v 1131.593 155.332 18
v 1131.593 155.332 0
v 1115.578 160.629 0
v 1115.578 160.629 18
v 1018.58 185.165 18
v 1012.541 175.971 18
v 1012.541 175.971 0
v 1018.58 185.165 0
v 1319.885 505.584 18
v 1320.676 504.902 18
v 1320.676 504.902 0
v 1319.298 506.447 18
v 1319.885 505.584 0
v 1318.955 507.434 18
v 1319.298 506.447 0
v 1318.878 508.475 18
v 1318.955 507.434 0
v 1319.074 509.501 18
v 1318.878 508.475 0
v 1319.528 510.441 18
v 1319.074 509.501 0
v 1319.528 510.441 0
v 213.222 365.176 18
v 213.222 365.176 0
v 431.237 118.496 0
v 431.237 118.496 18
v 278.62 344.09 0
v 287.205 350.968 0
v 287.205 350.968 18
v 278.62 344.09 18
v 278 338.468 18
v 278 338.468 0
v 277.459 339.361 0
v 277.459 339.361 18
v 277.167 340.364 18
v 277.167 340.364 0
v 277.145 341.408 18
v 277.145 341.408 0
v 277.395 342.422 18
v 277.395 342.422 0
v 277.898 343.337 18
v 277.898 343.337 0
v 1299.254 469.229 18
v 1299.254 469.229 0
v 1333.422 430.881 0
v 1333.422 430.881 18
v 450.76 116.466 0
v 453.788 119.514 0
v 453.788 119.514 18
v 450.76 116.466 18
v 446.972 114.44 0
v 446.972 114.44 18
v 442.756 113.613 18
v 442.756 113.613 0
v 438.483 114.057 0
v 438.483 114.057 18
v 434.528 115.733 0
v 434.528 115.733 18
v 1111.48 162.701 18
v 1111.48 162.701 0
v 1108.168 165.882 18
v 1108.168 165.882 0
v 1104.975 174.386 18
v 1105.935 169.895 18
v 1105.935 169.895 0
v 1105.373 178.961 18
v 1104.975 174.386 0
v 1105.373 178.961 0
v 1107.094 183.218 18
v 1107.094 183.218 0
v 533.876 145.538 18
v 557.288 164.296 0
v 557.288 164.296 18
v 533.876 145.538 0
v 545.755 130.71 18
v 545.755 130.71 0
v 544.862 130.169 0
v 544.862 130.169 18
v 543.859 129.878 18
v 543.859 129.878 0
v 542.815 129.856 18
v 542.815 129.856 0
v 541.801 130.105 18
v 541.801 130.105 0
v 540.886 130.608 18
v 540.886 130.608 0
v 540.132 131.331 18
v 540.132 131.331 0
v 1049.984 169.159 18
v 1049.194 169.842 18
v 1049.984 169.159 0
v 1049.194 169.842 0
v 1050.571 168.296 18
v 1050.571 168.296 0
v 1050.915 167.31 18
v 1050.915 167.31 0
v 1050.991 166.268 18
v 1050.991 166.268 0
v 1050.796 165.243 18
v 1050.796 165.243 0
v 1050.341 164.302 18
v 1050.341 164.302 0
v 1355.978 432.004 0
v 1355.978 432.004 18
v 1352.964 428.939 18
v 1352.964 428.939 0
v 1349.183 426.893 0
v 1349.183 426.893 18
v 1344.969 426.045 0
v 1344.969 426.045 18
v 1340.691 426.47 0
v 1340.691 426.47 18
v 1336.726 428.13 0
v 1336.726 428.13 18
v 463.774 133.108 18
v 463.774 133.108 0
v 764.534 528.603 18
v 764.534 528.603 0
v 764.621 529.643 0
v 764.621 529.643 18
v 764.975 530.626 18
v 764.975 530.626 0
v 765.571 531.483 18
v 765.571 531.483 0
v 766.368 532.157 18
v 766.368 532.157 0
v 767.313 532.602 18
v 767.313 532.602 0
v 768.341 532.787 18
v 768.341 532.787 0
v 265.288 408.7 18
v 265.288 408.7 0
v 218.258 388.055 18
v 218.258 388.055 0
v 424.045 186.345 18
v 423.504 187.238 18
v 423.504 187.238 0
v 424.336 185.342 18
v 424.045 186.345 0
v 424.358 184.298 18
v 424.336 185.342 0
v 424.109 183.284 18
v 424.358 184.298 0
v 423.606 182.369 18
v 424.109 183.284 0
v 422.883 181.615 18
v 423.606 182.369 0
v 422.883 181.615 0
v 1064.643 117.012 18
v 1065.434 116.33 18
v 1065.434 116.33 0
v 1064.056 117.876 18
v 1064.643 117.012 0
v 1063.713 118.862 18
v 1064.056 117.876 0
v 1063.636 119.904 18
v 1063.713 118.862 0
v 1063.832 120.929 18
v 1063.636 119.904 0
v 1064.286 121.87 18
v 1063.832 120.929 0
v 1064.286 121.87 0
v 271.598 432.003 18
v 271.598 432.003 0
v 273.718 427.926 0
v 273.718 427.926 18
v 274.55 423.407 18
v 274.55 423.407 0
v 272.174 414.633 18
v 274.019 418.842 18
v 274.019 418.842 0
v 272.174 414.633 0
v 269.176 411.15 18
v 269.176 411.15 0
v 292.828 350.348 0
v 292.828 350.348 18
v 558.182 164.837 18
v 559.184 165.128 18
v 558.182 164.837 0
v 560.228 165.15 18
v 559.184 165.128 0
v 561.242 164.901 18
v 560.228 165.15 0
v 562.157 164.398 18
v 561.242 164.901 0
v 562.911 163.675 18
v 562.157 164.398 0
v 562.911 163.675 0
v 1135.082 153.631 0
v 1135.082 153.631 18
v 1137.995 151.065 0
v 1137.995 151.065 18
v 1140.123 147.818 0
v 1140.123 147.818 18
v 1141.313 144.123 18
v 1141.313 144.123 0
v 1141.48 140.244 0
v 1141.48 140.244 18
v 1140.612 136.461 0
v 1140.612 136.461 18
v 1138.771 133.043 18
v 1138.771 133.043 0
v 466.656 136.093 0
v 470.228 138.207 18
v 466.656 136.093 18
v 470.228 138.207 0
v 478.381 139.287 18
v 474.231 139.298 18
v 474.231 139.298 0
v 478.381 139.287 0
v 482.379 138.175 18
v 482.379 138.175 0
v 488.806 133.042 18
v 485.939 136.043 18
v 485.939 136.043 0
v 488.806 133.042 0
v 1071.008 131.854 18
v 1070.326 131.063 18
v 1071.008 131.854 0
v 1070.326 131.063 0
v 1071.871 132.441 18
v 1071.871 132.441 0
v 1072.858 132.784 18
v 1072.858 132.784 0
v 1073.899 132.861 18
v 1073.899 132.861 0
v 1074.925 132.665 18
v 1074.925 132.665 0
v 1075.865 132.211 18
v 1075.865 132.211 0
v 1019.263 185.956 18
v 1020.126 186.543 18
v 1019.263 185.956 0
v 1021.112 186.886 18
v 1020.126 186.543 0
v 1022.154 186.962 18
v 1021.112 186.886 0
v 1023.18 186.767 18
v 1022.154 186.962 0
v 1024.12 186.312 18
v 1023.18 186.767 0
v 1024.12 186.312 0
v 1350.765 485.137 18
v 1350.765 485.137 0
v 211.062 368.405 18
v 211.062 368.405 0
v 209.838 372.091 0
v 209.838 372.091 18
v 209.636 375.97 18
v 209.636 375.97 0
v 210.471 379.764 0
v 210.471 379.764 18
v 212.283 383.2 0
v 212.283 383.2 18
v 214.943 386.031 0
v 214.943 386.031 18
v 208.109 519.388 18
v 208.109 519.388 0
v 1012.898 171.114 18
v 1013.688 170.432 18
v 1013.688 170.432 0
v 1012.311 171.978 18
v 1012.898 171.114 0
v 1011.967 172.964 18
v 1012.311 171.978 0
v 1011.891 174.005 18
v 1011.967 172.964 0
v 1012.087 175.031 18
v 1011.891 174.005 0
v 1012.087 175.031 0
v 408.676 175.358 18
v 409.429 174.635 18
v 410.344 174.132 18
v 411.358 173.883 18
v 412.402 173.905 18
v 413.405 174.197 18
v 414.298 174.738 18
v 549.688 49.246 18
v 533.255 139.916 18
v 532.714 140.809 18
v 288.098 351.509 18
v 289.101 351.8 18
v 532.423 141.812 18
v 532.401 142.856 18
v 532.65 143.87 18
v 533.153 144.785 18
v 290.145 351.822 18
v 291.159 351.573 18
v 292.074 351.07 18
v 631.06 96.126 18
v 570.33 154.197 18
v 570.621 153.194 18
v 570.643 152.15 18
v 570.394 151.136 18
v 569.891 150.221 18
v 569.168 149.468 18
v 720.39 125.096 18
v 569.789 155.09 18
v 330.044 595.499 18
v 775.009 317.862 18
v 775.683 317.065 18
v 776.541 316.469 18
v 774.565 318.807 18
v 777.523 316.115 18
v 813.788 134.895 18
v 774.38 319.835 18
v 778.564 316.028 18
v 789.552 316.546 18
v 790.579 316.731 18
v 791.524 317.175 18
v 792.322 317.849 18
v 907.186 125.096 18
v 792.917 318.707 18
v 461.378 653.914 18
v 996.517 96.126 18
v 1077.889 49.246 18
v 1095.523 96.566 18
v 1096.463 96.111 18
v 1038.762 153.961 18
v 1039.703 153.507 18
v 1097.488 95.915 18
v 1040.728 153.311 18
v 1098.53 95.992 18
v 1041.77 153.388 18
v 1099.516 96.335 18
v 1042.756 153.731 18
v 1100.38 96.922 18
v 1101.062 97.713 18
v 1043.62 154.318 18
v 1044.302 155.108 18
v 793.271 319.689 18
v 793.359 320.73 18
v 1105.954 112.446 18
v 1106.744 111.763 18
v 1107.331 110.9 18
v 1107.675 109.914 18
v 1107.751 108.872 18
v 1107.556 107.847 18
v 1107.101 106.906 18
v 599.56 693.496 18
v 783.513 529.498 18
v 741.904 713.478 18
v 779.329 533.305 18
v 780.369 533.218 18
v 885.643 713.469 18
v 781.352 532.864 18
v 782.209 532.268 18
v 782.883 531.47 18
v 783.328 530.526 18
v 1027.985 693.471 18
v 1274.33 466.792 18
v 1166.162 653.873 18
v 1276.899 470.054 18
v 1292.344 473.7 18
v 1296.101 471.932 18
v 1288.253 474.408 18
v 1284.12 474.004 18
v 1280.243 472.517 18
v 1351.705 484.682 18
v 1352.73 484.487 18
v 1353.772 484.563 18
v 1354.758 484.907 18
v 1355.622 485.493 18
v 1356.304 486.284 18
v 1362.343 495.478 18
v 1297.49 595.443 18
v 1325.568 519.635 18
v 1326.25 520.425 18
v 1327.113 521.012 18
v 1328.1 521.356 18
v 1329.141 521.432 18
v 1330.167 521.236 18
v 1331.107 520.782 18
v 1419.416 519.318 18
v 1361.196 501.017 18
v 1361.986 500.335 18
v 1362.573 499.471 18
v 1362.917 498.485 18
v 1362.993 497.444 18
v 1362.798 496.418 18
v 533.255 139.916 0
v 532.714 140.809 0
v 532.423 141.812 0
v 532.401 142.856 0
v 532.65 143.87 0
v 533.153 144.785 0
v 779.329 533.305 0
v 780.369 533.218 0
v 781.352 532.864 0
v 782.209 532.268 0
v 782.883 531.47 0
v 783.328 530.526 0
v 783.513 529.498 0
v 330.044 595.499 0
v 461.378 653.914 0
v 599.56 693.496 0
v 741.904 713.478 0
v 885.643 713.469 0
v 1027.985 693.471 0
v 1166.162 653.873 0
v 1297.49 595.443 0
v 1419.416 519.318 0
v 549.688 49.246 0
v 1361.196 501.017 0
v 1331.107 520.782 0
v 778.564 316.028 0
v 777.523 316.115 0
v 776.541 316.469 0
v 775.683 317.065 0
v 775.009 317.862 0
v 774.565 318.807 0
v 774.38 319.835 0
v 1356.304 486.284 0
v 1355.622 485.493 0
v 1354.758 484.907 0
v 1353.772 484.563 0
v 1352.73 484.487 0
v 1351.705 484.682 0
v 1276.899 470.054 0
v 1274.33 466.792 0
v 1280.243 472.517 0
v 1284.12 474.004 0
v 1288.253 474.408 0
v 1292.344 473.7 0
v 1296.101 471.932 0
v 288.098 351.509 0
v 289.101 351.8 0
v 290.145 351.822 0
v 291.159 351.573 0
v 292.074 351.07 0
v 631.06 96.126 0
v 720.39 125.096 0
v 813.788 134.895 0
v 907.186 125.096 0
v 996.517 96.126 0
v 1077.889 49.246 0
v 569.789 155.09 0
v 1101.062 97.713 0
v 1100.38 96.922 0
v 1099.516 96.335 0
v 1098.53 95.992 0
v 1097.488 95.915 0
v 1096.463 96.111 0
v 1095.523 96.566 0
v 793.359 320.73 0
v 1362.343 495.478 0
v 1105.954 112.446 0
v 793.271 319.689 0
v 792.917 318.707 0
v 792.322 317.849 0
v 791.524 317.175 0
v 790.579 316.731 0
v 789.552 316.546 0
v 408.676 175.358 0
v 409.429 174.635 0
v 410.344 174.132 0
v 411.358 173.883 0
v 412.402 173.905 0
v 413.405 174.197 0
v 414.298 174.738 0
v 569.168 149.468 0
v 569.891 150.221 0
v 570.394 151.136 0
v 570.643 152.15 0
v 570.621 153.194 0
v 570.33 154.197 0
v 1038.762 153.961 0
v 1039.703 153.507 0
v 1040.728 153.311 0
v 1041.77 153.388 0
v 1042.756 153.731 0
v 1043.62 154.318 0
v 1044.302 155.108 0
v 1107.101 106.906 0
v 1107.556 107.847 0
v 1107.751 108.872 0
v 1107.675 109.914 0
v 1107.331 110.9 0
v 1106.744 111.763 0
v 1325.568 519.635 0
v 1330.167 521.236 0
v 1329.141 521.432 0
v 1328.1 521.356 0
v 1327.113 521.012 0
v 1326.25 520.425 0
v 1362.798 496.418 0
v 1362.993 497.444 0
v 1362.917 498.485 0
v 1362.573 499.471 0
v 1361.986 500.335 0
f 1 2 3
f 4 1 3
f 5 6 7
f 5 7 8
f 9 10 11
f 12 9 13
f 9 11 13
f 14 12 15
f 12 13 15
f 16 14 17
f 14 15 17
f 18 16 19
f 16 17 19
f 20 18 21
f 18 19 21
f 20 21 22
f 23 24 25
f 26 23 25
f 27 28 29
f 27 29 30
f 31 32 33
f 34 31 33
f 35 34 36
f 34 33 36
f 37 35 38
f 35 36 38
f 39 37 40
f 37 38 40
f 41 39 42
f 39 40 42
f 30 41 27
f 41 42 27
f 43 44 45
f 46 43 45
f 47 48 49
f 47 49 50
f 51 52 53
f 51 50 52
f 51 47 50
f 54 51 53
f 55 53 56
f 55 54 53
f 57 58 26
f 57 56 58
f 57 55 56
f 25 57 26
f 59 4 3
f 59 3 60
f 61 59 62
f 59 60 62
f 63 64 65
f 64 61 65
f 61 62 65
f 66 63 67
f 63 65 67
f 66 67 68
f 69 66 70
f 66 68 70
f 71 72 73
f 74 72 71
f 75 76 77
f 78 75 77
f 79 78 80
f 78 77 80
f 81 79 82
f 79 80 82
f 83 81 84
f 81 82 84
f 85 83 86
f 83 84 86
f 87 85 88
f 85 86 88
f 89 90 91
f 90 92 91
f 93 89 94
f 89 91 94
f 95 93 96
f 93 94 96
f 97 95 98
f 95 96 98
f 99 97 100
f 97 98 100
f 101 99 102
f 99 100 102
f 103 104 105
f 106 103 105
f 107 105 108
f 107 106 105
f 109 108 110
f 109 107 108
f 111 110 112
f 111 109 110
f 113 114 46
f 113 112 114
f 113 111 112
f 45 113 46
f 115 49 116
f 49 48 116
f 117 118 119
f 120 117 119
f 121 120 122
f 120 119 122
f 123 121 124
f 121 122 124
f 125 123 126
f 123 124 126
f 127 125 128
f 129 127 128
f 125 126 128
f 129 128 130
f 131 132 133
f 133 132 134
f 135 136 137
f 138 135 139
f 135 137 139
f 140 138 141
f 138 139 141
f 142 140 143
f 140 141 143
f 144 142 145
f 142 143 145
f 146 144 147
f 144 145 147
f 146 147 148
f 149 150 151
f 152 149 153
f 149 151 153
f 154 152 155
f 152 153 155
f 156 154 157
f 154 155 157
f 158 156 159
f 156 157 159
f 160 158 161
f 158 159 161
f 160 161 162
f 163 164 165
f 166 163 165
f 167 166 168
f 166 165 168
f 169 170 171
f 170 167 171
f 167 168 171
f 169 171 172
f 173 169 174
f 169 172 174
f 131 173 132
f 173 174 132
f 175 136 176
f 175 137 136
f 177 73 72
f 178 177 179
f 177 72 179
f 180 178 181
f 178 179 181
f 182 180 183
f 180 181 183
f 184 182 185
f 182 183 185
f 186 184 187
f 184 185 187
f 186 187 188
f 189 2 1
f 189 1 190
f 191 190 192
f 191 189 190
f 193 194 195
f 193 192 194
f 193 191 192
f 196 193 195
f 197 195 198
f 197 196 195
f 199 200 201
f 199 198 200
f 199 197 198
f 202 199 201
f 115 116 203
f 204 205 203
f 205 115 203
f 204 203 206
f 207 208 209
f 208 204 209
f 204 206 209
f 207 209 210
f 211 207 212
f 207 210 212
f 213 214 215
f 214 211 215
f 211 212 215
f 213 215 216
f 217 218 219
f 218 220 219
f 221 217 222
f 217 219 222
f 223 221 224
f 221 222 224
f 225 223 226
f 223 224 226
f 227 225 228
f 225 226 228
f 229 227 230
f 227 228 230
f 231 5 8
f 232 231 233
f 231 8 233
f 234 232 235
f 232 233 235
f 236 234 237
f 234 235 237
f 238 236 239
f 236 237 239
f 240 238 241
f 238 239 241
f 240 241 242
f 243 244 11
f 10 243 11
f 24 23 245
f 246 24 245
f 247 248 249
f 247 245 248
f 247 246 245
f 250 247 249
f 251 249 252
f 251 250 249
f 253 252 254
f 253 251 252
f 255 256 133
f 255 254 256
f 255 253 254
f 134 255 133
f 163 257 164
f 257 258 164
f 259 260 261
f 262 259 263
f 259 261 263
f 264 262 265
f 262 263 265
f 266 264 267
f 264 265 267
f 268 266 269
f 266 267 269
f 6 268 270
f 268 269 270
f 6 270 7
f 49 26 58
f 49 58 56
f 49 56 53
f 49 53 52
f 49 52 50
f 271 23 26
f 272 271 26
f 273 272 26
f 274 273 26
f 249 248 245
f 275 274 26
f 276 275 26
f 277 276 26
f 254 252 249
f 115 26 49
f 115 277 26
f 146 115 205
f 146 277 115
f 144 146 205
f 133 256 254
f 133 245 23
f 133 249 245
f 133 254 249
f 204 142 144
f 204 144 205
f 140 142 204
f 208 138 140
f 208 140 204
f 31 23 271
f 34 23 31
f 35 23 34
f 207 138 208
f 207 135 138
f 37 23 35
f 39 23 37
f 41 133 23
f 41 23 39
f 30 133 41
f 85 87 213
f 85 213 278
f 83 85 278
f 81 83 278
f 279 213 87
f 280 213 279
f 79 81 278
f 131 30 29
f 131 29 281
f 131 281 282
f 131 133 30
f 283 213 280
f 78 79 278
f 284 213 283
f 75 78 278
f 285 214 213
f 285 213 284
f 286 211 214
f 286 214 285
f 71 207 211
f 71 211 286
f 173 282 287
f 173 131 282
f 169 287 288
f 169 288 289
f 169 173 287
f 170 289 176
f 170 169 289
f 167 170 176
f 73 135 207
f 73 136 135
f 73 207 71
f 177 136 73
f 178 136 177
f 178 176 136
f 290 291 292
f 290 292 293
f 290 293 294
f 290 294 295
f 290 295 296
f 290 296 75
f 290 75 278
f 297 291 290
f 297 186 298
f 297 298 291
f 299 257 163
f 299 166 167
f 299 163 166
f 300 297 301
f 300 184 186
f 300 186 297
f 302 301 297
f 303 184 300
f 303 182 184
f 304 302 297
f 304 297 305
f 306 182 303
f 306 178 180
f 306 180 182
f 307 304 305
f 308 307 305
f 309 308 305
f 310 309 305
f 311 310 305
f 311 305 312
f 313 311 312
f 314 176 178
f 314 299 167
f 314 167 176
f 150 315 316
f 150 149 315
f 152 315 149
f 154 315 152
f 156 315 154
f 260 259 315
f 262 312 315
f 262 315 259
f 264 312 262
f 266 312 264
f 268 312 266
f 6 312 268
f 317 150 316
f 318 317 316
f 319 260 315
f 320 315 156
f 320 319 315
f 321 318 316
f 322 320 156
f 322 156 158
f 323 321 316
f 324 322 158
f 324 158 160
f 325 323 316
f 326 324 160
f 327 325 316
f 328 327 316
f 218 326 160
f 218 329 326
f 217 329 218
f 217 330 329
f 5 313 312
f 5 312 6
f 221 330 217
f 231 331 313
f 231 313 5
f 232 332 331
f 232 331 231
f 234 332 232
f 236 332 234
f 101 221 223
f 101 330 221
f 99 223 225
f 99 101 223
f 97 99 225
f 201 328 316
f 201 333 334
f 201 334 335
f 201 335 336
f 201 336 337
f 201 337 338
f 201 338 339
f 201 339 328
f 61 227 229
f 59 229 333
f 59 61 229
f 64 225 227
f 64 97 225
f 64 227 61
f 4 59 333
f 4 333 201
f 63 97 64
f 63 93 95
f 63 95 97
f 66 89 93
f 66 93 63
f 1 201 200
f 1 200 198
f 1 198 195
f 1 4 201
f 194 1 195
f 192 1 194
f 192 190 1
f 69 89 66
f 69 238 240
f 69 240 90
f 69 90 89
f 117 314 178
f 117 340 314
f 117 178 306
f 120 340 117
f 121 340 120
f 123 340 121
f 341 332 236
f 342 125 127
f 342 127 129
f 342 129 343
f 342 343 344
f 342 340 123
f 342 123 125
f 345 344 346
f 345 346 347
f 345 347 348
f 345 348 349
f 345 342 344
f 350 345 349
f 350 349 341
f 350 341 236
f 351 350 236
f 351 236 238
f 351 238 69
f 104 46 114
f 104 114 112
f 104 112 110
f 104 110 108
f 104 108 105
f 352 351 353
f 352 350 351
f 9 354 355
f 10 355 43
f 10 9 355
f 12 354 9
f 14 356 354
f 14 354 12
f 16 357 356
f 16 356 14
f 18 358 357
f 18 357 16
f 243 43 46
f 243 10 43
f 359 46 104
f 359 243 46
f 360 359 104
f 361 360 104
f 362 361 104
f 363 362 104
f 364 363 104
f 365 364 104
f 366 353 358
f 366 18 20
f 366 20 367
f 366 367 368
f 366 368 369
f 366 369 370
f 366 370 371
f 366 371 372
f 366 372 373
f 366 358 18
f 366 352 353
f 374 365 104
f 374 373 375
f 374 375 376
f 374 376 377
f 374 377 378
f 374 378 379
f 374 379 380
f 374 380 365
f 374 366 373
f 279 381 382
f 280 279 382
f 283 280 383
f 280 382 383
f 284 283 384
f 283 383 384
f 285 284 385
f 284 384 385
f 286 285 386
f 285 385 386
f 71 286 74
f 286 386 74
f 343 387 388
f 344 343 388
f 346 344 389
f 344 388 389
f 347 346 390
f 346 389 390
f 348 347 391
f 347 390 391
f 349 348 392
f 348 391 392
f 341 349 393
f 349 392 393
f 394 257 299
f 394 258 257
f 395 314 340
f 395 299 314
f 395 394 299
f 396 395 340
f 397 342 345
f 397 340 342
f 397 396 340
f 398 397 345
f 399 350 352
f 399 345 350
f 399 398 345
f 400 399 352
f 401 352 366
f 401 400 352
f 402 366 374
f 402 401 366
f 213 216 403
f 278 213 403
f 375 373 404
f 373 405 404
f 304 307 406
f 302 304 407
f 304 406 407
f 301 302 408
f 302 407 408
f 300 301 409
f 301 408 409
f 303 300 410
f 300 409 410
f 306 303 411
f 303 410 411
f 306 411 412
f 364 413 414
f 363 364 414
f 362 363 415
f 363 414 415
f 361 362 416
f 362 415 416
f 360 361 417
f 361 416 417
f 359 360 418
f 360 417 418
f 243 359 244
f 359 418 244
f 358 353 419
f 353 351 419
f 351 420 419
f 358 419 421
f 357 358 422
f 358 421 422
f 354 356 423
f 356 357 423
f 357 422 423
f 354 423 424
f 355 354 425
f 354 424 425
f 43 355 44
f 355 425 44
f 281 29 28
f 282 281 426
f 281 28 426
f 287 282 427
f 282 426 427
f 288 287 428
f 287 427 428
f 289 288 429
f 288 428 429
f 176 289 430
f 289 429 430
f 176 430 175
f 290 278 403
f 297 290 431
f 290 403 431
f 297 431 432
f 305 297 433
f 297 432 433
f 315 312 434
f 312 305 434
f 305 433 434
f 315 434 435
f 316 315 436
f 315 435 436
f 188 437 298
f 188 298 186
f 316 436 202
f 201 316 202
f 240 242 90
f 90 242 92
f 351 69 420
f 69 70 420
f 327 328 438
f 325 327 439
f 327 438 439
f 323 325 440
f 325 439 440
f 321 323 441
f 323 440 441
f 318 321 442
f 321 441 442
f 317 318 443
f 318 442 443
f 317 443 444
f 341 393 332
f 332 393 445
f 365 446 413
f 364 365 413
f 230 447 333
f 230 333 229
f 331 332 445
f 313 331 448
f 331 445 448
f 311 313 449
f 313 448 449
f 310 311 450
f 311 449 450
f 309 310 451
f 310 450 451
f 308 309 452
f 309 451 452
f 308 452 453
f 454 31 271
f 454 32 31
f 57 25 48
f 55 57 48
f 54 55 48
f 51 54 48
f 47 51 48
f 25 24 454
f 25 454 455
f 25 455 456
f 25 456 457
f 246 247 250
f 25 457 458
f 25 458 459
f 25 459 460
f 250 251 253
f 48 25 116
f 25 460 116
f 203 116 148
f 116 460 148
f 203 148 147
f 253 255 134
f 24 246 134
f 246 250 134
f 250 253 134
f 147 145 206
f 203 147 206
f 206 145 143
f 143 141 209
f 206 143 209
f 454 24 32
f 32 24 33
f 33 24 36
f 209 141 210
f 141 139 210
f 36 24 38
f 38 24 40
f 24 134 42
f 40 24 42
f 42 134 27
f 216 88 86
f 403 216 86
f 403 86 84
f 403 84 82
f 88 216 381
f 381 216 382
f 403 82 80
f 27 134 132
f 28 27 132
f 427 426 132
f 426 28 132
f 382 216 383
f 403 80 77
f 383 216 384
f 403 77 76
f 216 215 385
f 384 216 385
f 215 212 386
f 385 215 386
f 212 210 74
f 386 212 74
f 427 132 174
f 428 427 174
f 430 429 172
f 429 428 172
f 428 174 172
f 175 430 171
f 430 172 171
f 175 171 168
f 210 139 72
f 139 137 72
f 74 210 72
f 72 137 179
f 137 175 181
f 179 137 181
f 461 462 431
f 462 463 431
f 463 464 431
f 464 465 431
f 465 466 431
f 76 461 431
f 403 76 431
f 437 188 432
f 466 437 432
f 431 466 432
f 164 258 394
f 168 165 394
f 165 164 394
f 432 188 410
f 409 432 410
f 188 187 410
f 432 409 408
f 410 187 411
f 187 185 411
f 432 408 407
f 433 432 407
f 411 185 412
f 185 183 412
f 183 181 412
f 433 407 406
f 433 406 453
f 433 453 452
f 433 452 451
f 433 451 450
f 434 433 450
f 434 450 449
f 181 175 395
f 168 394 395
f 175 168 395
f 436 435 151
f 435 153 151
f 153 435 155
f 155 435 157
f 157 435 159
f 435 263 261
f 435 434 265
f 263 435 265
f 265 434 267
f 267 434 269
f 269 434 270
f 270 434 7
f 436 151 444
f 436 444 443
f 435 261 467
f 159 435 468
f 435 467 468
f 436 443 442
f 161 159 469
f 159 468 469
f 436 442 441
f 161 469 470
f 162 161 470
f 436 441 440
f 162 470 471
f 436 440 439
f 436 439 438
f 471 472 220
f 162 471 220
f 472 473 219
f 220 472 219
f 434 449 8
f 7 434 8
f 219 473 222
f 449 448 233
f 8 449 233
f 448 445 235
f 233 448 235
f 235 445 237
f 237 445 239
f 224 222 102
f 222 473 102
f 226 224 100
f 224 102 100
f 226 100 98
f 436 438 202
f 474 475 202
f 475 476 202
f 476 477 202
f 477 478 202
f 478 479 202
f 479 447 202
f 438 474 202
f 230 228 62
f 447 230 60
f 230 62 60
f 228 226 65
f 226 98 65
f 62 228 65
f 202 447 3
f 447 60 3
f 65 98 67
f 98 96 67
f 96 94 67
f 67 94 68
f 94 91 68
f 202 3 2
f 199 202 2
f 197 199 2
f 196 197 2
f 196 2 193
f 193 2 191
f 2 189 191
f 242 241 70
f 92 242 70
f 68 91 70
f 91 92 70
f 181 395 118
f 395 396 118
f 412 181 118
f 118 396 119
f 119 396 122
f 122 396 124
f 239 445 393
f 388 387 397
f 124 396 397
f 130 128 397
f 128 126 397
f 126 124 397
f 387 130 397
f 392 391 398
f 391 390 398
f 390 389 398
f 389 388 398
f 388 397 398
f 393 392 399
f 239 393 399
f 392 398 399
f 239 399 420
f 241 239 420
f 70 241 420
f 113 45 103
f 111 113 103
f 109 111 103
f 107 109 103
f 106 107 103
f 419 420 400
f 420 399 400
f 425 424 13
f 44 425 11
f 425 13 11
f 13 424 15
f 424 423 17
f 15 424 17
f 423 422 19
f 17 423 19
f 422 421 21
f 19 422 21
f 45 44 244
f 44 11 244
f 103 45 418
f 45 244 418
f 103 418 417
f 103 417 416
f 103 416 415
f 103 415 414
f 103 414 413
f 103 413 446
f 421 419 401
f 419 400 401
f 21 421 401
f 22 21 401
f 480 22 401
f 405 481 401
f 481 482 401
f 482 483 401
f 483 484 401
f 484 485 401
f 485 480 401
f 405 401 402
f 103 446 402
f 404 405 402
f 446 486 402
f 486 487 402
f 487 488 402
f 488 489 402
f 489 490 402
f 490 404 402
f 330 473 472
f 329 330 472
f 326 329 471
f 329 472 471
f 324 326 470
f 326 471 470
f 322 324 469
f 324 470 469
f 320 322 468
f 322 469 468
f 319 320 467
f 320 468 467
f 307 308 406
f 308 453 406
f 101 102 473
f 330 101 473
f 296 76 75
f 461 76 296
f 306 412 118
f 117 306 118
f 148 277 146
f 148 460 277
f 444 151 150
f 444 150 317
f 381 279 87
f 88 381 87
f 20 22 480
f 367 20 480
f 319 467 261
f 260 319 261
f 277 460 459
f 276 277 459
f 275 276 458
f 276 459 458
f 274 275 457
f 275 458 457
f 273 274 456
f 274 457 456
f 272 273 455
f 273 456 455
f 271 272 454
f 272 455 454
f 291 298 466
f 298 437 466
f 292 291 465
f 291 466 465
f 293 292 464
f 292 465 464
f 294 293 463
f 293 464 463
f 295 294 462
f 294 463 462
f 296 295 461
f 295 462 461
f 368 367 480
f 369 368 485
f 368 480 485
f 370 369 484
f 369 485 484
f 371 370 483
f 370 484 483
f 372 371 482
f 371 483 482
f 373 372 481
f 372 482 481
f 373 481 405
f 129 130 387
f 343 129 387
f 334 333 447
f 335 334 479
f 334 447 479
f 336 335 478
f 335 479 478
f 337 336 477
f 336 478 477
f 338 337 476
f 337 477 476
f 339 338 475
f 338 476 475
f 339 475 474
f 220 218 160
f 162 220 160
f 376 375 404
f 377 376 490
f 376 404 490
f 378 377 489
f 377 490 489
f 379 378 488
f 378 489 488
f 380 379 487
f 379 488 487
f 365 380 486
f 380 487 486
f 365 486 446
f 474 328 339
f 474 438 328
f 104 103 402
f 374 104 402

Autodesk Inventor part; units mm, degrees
ref_plane "YZ Plane" through (0, 0, 0) normal (1, 0, 0) x (0, 1, 0)
ref_plane "XZ Plane" through (0, 0, 0) normal (0, 1, 0) x (-1, 0, 0)
ref_plane "XY Plane" through (0, 0, 0) normal (0, 0, 1) x (1, 0, 0)
sketch "Sketch1" plane through (0, 0, 0) normal (0, 0, 1) x (1, 0, 0)
  point P0 (0, 0)
sketch "CONTOURS" plane through (0, 0, 0) normal (0, 0, 1) x (1, 0, 0)
  arc A0 (1138.7708, 133.0427) -> (1131.5929, 155.3323) centre (1127.04, 141.5656) ccw
  line L0 (1131.5929, 155.3323) -> (1115.5781, 160.6286)
  arc A1 (1107.0938, 183.2185) -> (1115.5781, 160.6286) centre (1120.445, 175.3447) ccw
  line L1 (1107.0938, 183.2185) -> (1274.33, 466.7921)
  arc A2 (1299.254, 469.2294) -> (1274.33, 466.7921) centre (1287.6812, 458.9183) ccw
  line L2 (1299.254, 469.2294) -> (1333.4216, 430.8808)
  arc A3 (1333.4216, 430.8808) -> (1355.9785, 432.0038) centre (1344.2478, 440.5267) ccw
  line L3 (1355.9785, 432.0038) -> (1419.4157, 519.3176)
  arc A4 (1419.4157, 519.3176) -> (208.109, 519.3881) centre (813.7138, -315.0977) ccw
  line L4 (208.109, 519.3881) -> (271.5978, 432.0034)
  arc A5 (265.2883, 408.6999) -> (271.5978, 432.0034) centre (259.0581, 422.8927) ccw
  line L5 (265.2883, 408.6999) -> (218.2583, 388.055)
  arc A6 (218.2583, 388.055) -> (213.2217, 365.1756) centre (224.0866, 374.778) ccw
  line L6 (213.2217, 365.1756) -> (431.2374, 118.4955)
  arc A7 (431.2374, 118.4955) -> (453.7882, 119.5137) centre (442.1023, 128.0978) ccw
  line L7 (453.7882, 119.5137) -> (463.7742, 133.108)
  arc A8 (488.8058, 133.0425) -> (463.7742, 133.108) centre (476.2661, 123.9318) ccw
  line L8 (488.8058, 133.0425) -> (549.6876, 49.246)
  arc A9 (1077.8891, 49.2462) -> (549.6876, 49.246) centre (813.7885, -315.108) ccw
  line L9 (1077.8891, 49.2462) -> (1138.7708, 133.0427)
sketch "HOLES" plane through (0, 0, 0) normal (0, 0, 1) x (1, 0, 0)
  line L0 (287.205, 350.9682) -> (278.6203, 344.0905)
  arc A0 (278.6203, 344.0905) -> (277.9995, 338.4678) centre (281.1212, 340.9688) ccw
  line L1 (277.9995, 338.4678) -> (408.6757, 175.3582)
  arc A1 (408.6757, 175.3582) -> (414.2984, 174.7375) centre (411.7974, 177.8592) ccw
  line L2 (414.2984, 174.7375) -> (422.8831, 181.6152)
  arc A2 (422.8831, 181.6152) -> (423.5039, 187.2379) centre (420.3822, 184.7369) ccw
  line L3 (423.5039, 187.2379) -> (292.8277, 350.3475)
  arc A3 (292.8277, 350.3475) -> (287.205, 350.9682) centre (289.706, 347.8465) ccw
  arc A4 (783.5127, 529.4978) -> (779.3287, 533.3049) centre (779.5172, 529.3094) ccw
  line L4 (783.5127, 529.4978) -> (793.3586, 320.7299)
  arc A5 (789.5515, 316.5459) -> (793.3586, 320.7299) centre (789.363, 320.5414) ccw
  line L5 (789.5515, 316.5459) -> (778.5637, 316.0277)
  arc A6 (774.3797, 319.8348) -> (778.5637, 316.0277) centre (778.3752, 320.0232) ccw
  line L6 (774.3797, 319.8348) -> (764.5338, 528.6027)
  arc A7 (768.3409, 532.7867) -> (764.5338, 528.6027) centre (768.5294, 528.7912) ccw
  line L7 (768.3409, 532.7867) -> (779.3287, 533.3049)
  line L8 (569.7888, 155.0903) -> (562.9111, 163.675)
  arc A8 (562.9111, 163.675) -> (557.2884, 164.2957) centre (559.7894, 161.174) ccw
  line L9 (557.2884, 164.2957) -> (533.8755, 145.5384)
  arc A9 (533.8755, 145.5384) -> (533.2548, 139.9157) centre (536.3765, 142.4167) ccw
  line L10 (533.2548, 139.9157) -> (540.1325, 131.331)
  arc A10 (540.1325, 131.331) -> (545.7552, 130.7102) centre (543.2542, 133.832) ccw
  line L11 (545.7552, 130.7102) -> (569.168, 149.4676)
  arc A11 (569.168, 149.4676) -> (569.7888, 155.0903) centre (566.6671, 152.5893) ccw
  line L12 (1012.5411, 175.9713) -> (1018.5803, 185.1652)
  arc A12 (1024.1197, 186.3123) -> (1018.5803, 185.1652) centre (1021.9236, 182.9691) ccw
  line L13 (1024.1197, 186.3123) -> (1049.1939, 169.8417)
  arc A13 (1050.3411, 164.3024) -> (1049.1939, 169.8417) centre (1046.9978, 166.4985) ccw
  line L14 (1059.1699, 932.849) -> (1052.9484, 923.7775)
  arc A14 (1047.3873, 922.7411) -> (1052.9484, 923.7775) centre (1049.6497, 926.0399) ccw
  line L15 (1047.3873, 922.7411) -> (1017.6987, 943.1026)
  arc A15 (1016.6623, 948.6637) -> (1017.6987, 943.1026) centre (1019.9611, 946.4013) ccw
  line L16 (1016.6623, 948.6637) -> (1022.8839, 957.7352)
  arc A16 (1028.445, 958.7715) -> (1022.8839, 957.7352) centre (1026.1826, 955.4728) ccw
  line L17 (1028.445, 958.7715) -> (1058.1336, 938.4101)
  arc A17 (1059.1699, 932.849) -> (1058.1336, 938.4101) centre (1055.8712, 935.1114) ccw
  arc A18 (2370.6146, 1037.7855) -> (2376.2246, 1037.059) centre (2373.7829, 1040.2273) ccw
  line L18 (2370.6146, 1037.7855) -> (2296.1408, 1134.417)
  arc A19 (2296.8672, 1140.027) -> (2296.1408, 1134.417) centre (2299.309, 1136.8588) ccw
  line L19 (2296.8672, 1140.027) -> (2305.5799, 1146.7419)
  arc A20 (2311.1899, 1146.0154) -> (2305.5799, 1146.7419) centre (2308.0217, 1143.5736) ccw
  line L20 (2311.1899, 1146.0154) -> (2385.6638, 1049.3839)
  arc A21 (2384.9373, 1043.7739) -> (2385.6638, 1049.3839) centre (2382.4955, 1046.9421) ccw
  line L21 (2384.9373, 1043.7739) -> (2376.2246, 1037.059)
  line L22 (1175.8209, 1180.7295) -> (1169.5993, 1171.658)
  arc A22 (1169.5993, 1171.658) -> (1170.6357, 1166.0969) centre (1172.898, 1169.3956) ccw
  line L23 (1170.6357, 1166.0969) -> (1200.3242, 1145.7355)
  arc A23 (1200.3242, 1145.7355) -> (1205.8854, 1146.7718) centre (1202.5866, 1149.0342) ccw
  line L24 (1205.8854, 1146.7718) -> (1212.1069, 1155.8433)
  arc A24 (1212.1069, 1155.8433) -> (1211.0706, 1161.4044) centre (1208.8082, 1158.1057) ccw
  line L25 (1211.0706, 1161.4044) -> (1181.382, 1181.7659)
  arc A25 (1181.382, 1181.7659) -> (1175.8209, 1180.7295) centre (1179.1196, 1178.4671) ccw
  line L26 (1050.3411, 164.3024) -> (1044.3019, 155.1085)
  arc A26 (1038.7625, 153.9613) -> (1044.3019, 155.1085) centre (1040.9586, 157.3046) ccw
  line L27 (1038.7625, 153.9613) -> (1013.6883, 170.4319)
  arc A27 (1012.5411, 175.9713) -> (1013.6883, 170.4319) centre (1015.8843, 173.7752) ccw
  line L28 (1101.0619, 97.7126) -> (1107.1011, 106.9065)
  arc A28 (1107.1011, 106.9065) -> (1105.954, 112.4458) centre (1103.7579, 109.1026) ccw
  line L29 (1105.954, 112.4458) -> (1075.8649, 132.2106)
  arc A29 (1075.8649, 132.2106) -> (1070.3255, 131.0634) centre (1073.6688, 128.8673) ccw
  line L30 (1070.3255, 131.0634) -> (1064.2863, 121.8695)
  arc A30 (1064.2863, 121.8695) -> (1065.4335, 116.3302) centre (1067.6295, 119.6734) ccw
  line L31 (1065.4335, 116.3302) -> (1095.5226, 96.5655)
  arc A31 (1095.5226, 96.5655) -> (1101.0619, 97.7126) centre (1097.7187, 99.9087) ccw
  line L32 (1362.3431, 495.4778) -> (1356.3039, 486.2839)
  arc A32 (1350.7646, 485.1368) -> (1356.3039, 486.2839) centre (1352.9607, 488.48) ccw
  line L33 (1350.7646, 485.1368) -> (1320.6755, 504.9015)
  arc A33 (1319.5283, 510.4408) -> (1320.6755, 504.9015) centre (1322.8716, 508.2448) ccw
  line L34 (1319.5283, 510.4408) -> (1325.5675, 519.6347)
  arc A34 (1331.1069, 520.7819) -> (1325.5675, 519.6347) centre (1328.9108, 517.4387) ccw
  line L35 (1331.1069, 520.7819) -> (1361.196, 501.0172)
  arc A35 (1362.3431, 495.4778) -> (1361.196, 501.0172) centre (1358.9999, 497.6739) ccw
  line L36 (1264.9795, 244.1751) -> (1271.0187, 253.369)
  arc A36 (1276.558, 254.5161) -> (1271.0187, 253.369) centre (1274.3619, 251.1729) ccw
  line L37 (1276.558, 254.5161) -> (1306.6471, 234.7514)
  arc A37 (1307.7943, 229.2121) -> (1306.6471, 234.7514) centre (1304.451, 231.4082) ccw
  line L38 (1307.7943, 229.2121) -> (1301.7551, 220.0182)
  arc A38 (1296.2157, 218.871) -> (1301.7551, 220.0182) centre (1298.4118, 222.2143) ccw
  line L39 (1296.2157, 218.871) -> (1266.1266, 238.6358)
  arc A39 (1264.9795, 244.1751) -> (1266.1266, 238.6358) centre (1268.3227, 241.979) ccw
  line L40 (1526.2607, 641.9403) -> (1520.2215, 632.7464)
  arc A40 (1520.2215, 632.7464) -> (1521.3686, 627.2071) centre (1523.5647, 630.5503) ccw
  line L41 (1521.3686, 627.2071) -> (1551.4577, 607.4424)
  arc A41 (1551.4577, 607.4424) -> (1556.9971, 608.5895) centre (1553.6538, 610.7856) ccw
  line L42 (1556.9971, 608.5895) -> (1563.0363, 617.7834)
  arc A42 (1563.0363, 617.7834) -> (1561.8891, 623.3227) centre (1559.6931, 619.9795) ccw
  line L43 (1561.8891, 623.3227) -> (1531.8, 643.0875)
  arc A43 (1531.8, 643.0875) -> (1526.2607, 641.9403) centre (1529.6039, 639.7442) ccw
sketch "LETTERS" plane through (0, 0, 0) normal (0, 0, 1) x (1, 0, 0)
  arc A0 (1107.5534, 367.1718) -> (1103.7785, 359.006) centre (1105.6754, 363.0845) ccw
  line L0 (1107.5534, 367.1718) -> (1115.5892, 363.4795)
  arc A1 (1112.0249, 376.8584) -> (1107.5534, 367.1718) centre (1109.7806, 372.0191) ccw
  line L1 (1120.1257, 373.1016) -> (1112.0249, 376.8584)
  line L2 (1111.8629, 355.2459) -> (1120.1257, 373.1016)
  line L3 (1103.7785, 359.006) -> (1111.8629, 355.2459)
extrude "Extrusion2" add sketch "CONTOURS" along normal blind 18
extrude "Extrusion3" cut sketch "HOLES" along normal through all contours A3 L3 A2 L2 A1 L1 A0 L0 | L4 A5 L5 A6 L6 A7 L7 A4 | A11 L11 A10 L10 A9 L9 A8 L8 | L12 A12 L13 A13 L26 A26 L27 A27 | A31 L31 A30 L30 A29 L29 A28 L28 | L32 A32 L33 A33 L34 A34 L35 A35
properties part number "Platform B3" material "Wood (Birch)"
